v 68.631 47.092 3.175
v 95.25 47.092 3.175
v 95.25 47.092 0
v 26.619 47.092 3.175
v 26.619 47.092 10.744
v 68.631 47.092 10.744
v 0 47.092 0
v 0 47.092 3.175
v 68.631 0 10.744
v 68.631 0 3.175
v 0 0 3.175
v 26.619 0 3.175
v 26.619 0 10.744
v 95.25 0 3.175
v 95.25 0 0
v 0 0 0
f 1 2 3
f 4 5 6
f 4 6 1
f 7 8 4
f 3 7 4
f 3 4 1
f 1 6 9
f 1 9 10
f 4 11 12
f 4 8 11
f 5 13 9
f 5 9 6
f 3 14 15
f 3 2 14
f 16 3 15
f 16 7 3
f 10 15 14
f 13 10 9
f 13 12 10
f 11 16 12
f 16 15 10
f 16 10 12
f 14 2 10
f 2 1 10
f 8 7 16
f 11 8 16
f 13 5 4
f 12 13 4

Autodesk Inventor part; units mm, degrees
ref_plane "YZ Plane" through (0, 0, 0) normal (1, 0, 0) x (0, 1, 0)
ref_plane "XZ Plane" through (0, 0, 0) normal (0, 1, 0) x (-1, 0, 0)
ref_plane "XY Plane" through (0, 0, 0) normal (0, 0, 1) x (1, 0, 0)
sketch "Sketch1" plane through (0, 0, 0) normal (0, 0, 1) x (1, 0, 0)
  line L0 (0, 0) -> (26.6192, 0)
  line L1 (26.6192, 0) -> (26.6192, 47.0916)
  line L2 (26.6192, 47.0916) -> (0, 47.0916)
  line L3 (0, 47.0916) -> (0, 0)
  dimension "d0" = 26.6192
  dimension "d1" = 47.0916
extrude "Extrusion1" add sketch "Sketch1" along normal blind 3.175
sketch "Sketch6" plane through (26.6192, 0, 0) normal (1, 0, 0) x (0, 0, -1)
  line L0 (0, 0) -> (-10.7442, 0)
  line L1 (-10.7442, 0) -> (-10.7442, 47.0916)
  line L2 (-10.7442, 47.0916) -> (0, 47.0916)
  line L3 (0, 47.0916) -> (0, 0)
  dimension "d15" = 10.7442
extrude "Extrusion6" add sketch "Sketch6" along normal blind 42.0116
sketch "Sketch7" plane through (68.6308, 0, 0) normal (1, 0, 0) x (0, 0, -1)
  line L0 (0, 47.0916) -> (0, 0) projected
  line L1 (-3.175, 47.0916) -> (-3.175, 0) projected
  line L2 (0, 0) -> (-3.175, 0)
  line L3 (-3.175, 0) -> (-3.175, 47.0916)
  line L4 (-3.175, 47.0916) -> (0, 47.0916)
  line L5 (0, 47.0916) -> (0, 0)
extrude "Extrusion7" add sketch "Sketch7" along normal blind 26.6192
properties part number "bagcimspacer" material "Aluminum 6061"
